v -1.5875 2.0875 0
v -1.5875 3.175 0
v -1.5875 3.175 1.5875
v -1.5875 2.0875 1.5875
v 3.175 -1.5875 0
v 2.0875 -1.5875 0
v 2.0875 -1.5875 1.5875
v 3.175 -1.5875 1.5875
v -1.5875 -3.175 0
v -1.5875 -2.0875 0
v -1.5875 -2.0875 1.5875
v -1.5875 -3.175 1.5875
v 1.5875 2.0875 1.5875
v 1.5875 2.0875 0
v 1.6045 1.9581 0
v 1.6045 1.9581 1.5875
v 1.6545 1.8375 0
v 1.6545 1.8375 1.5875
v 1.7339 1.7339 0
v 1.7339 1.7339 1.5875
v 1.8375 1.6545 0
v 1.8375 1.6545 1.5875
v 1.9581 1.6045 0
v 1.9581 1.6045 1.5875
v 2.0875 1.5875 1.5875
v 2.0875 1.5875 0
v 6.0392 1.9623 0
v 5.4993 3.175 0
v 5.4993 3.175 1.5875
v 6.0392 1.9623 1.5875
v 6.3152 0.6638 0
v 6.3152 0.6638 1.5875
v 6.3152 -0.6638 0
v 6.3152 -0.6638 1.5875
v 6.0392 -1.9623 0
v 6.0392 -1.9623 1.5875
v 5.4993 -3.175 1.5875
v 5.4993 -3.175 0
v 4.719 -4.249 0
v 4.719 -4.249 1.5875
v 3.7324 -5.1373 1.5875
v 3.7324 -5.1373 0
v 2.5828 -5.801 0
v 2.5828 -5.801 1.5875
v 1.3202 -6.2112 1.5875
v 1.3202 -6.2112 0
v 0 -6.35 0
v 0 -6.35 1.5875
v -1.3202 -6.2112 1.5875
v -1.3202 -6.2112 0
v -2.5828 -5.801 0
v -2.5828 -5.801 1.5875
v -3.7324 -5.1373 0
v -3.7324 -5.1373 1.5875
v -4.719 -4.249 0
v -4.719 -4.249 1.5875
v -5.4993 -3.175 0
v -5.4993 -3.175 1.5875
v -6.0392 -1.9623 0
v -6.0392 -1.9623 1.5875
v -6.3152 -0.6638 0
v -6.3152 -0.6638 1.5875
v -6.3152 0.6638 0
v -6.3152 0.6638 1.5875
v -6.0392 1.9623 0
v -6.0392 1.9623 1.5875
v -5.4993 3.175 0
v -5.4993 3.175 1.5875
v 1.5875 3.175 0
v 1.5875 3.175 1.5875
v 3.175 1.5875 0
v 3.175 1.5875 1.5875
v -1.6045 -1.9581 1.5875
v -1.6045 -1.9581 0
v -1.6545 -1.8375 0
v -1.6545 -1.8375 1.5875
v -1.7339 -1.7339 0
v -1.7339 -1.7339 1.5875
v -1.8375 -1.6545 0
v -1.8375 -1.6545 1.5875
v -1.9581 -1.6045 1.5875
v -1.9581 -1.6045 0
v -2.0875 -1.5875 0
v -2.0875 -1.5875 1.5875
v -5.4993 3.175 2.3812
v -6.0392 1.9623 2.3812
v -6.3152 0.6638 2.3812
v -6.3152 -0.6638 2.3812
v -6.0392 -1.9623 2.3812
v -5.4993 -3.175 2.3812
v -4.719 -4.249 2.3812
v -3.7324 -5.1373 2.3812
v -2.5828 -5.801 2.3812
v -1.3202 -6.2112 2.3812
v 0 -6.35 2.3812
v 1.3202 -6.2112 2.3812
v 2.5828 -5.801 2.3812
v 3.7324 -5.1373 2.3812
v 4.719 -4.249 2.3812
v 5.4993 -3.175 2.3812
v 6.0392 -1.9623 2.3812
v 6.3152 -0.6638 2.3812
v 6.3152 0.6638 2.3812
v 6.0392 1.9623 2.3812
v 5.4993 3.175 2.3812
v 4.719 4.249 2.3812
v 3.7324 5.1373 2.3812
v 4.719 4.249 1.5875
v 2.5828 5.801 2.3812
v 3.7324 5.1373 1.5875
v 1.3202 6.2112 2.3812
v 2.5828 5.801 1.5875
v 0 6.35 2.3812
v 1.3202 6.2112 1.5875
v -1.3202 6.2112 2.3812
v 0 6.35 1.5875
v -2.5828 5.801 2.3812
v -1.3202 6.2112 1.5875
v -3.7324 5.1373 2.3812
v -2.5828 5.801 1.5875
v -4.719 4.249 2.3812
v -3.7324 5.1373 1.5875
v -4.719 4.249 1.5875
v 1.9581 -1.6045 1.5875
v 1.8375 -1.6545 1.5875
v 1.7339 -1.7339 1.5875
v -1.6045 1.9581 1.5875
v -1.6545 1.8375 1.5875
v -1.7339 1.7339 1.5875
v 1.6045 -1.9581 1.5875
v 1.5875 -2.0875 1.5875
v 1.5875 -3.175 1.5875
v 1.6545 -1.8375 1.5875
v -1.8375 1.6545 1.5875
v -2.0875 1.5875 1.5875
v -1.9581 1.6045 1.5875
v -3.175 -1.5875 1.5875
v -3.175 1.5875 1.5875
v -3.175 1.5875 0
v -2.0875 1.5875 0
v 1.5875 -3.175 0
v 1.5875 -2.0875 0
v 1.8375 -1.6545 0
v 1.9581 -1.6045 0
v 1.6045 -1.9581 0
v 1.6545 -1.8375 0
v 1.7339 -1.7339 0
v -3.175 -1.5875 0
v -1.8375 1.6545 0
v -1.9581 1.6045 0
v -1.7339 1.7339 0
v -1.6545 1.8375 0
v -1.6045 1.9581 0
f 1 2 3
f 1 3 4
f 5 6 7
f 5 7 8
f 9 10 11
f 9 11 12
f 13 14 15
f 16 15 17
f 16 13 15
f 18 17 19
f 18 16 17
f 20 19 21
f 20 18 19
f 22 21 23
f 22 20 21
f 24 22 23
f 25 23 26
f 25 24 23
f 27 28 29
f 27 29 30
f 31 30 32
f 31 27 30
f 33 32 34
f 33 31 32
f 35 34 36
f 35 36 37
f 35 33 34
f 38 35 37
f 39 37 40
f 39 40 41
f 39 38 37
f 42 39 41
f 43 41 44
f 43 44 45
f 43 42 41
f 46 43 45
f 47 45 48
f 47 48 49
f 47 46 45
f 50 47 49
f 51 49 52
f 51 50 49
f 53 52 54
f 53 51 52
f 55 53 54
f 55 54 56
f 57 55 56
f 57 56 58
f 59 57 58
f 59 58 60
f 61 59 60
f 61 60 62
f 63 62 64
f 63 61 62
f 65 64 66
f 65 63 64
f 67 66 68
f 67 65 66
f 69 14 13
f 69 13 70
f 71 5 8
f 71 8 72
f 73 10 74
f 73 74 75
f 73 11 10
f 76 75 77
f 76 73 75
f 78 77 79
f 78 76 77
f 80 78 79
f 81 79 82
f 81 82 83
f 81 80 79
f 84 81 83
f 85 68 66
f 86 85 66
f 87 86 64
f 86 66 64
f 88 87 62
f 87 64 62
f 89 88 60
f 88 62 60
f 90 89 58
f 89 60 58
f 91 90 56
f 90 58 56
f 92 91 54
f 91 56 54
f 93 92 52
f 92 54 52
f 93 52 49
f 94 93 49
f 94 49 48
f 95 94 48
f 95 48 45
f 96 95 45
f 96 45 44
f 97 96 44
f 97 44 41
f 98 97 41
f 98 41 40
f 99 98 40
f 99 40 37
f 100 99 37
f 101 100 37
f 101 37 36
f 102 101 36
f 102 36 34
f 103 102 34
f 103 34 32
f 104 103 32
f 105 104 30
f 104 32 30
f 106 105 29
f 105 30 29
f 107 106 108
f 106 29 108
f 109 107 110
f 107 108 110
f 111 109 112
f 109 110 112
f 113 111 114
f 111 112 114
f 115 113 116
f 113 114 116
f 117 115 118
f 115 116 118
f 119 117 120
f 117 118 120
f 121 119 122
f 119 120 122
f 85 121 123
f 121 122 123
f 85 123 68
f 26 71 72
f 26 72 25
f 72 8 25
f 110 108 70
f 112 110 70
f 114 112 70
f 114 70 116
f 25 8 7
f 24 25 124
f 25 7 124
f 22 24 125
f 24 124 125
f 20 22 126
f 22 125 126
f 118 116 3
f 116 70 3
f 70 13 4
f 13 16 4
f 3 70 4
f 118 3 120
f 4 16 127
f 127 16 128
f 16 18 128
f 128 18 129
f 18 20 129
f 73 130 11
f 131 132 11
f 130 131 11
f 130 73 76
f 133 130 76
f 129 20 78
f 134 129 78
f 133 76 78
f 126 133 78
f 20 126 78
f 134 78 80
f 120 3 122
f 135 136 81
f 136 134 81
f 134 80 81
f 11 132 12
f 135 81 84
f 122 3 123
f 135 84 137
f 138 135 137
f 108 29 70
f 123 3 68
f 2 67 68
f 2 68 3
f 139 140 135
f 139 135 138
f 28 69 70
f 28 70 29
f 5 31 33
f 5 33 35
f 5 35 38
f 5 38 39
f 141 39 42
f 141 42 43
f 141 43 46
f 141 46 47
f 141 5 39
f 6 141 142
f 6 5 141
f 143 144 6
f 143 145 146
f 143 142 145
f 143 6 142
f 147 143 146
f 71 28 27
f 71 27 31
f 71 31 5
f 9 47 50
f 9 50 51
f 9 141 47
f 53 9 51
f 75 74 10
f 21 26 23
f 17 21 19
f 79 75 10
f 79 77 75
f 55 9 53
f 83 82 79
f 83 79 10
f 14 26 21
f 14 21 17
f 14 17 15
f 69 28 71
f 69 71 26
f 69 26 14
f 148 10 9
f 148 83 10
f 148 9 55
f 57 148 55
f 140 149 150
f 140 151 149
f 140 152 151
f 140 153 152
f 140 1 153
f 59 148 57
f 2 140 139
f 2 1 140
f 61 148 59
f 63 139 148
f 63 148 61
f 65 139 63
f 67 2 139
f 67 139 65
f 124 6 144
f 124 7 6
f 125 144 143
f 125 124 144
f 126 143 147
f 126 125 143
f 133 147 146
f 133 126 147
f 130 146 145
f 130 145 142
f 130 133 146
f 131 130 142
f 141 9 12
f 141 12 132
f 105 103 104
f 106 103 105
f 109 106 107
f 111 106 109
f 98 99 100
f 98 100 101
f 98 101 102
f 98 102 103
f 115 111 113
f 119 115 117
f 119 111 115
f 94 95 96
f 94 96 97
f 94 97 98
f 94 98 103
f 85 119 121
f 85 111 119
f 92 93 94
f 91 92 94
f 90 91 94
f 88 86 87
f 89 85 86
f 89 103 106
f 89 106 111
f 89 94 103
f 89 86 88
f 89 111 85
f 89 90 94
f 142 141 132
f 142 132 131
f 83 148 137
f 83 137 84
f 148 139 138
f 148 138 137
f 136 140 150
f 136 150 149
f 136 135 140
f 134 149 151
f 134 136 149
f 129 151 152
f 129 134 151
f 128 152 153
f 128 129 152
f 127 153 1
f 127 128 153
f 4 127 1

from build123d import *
from build123d.topology import SkipClean

# Parameters (mm, degrees)
BOSS_EXTRUDE1_DEPTH = 1.5875
SKETCH2_R           = 6.35
BOSS_EXTRUDE2_DEPTH = 0.79375
FILLET1_R           = 0.5


with BuildPart() as part:
    # Sketch1 → Boss-Extrude1 (new body)
    with BuildSketch(Plane.XY):
        with BuildLine():
            Line((-1.5875, 3.175), (-1.5875, 1.5875))
            Line((-1.5875, 1.5875), (-3.175, 1.5875))
            Line((-3.175, 1.5875), (-3.175, -1.5875))
            Line((-3.175, -1.5875), (-1.5875, -1.5875))
            Line((-1.5875, -1.5875), (-1.5875, -3.175))
            Line((-1.5875, -3.175), (1.5875, -3.175))
            Line((1.5875, -3.175), (1.5875, -1.5875))
            Line((1.5875, -1.5875), (3.175, -1.5875))
            Line((3.175, -1.5875), (3.175, 1.5875))
            Line((3.175, 1.5875), (1.5875, 1.5875))
            Line((1.5875, 1.5875), (1.5875, 3.175))
            Line((1.5875, 3.175), (5.499261314, 3.175))
            ThreePointArc((5.499261314, 3.175), (0, -6.35), (-5.499261314, 3.175))
            Line((-5.499261314, 3.175), (-1.5875, 3.175))
        make_face()
    extrude(amount=BOSS_EXTRUDE1_DEPTH)

    # Sketch2 → Boss-Extrude2 (add)
    with SkipClean():  # the faces are left unmerged after this step: merging them gives an invalid solid
        with BuildSketch(Plane.XY.offset(1.5875)):
            with Locations(Location((0, 0, 0), (0, 0, 150))):
                Circle(SKETCH2_R)
        extrude(amount=BOSS_EXTRUDE2_DEPTH)

    # Fillet1
    fillet1_edges = [part.edges().sort_by_distance(p)[0] for p in [
        (-1.5875, 1.5875, 0.79375),
        (-1.5875, -1.5875, 0.79375),
        (1.5875, -1.5875, 0.79375),
        (1.5875, 1.5875, 0.79375),
    ]]
    fillet(fillet1_edges, radius=FILLET1_R)


solid = part.part
